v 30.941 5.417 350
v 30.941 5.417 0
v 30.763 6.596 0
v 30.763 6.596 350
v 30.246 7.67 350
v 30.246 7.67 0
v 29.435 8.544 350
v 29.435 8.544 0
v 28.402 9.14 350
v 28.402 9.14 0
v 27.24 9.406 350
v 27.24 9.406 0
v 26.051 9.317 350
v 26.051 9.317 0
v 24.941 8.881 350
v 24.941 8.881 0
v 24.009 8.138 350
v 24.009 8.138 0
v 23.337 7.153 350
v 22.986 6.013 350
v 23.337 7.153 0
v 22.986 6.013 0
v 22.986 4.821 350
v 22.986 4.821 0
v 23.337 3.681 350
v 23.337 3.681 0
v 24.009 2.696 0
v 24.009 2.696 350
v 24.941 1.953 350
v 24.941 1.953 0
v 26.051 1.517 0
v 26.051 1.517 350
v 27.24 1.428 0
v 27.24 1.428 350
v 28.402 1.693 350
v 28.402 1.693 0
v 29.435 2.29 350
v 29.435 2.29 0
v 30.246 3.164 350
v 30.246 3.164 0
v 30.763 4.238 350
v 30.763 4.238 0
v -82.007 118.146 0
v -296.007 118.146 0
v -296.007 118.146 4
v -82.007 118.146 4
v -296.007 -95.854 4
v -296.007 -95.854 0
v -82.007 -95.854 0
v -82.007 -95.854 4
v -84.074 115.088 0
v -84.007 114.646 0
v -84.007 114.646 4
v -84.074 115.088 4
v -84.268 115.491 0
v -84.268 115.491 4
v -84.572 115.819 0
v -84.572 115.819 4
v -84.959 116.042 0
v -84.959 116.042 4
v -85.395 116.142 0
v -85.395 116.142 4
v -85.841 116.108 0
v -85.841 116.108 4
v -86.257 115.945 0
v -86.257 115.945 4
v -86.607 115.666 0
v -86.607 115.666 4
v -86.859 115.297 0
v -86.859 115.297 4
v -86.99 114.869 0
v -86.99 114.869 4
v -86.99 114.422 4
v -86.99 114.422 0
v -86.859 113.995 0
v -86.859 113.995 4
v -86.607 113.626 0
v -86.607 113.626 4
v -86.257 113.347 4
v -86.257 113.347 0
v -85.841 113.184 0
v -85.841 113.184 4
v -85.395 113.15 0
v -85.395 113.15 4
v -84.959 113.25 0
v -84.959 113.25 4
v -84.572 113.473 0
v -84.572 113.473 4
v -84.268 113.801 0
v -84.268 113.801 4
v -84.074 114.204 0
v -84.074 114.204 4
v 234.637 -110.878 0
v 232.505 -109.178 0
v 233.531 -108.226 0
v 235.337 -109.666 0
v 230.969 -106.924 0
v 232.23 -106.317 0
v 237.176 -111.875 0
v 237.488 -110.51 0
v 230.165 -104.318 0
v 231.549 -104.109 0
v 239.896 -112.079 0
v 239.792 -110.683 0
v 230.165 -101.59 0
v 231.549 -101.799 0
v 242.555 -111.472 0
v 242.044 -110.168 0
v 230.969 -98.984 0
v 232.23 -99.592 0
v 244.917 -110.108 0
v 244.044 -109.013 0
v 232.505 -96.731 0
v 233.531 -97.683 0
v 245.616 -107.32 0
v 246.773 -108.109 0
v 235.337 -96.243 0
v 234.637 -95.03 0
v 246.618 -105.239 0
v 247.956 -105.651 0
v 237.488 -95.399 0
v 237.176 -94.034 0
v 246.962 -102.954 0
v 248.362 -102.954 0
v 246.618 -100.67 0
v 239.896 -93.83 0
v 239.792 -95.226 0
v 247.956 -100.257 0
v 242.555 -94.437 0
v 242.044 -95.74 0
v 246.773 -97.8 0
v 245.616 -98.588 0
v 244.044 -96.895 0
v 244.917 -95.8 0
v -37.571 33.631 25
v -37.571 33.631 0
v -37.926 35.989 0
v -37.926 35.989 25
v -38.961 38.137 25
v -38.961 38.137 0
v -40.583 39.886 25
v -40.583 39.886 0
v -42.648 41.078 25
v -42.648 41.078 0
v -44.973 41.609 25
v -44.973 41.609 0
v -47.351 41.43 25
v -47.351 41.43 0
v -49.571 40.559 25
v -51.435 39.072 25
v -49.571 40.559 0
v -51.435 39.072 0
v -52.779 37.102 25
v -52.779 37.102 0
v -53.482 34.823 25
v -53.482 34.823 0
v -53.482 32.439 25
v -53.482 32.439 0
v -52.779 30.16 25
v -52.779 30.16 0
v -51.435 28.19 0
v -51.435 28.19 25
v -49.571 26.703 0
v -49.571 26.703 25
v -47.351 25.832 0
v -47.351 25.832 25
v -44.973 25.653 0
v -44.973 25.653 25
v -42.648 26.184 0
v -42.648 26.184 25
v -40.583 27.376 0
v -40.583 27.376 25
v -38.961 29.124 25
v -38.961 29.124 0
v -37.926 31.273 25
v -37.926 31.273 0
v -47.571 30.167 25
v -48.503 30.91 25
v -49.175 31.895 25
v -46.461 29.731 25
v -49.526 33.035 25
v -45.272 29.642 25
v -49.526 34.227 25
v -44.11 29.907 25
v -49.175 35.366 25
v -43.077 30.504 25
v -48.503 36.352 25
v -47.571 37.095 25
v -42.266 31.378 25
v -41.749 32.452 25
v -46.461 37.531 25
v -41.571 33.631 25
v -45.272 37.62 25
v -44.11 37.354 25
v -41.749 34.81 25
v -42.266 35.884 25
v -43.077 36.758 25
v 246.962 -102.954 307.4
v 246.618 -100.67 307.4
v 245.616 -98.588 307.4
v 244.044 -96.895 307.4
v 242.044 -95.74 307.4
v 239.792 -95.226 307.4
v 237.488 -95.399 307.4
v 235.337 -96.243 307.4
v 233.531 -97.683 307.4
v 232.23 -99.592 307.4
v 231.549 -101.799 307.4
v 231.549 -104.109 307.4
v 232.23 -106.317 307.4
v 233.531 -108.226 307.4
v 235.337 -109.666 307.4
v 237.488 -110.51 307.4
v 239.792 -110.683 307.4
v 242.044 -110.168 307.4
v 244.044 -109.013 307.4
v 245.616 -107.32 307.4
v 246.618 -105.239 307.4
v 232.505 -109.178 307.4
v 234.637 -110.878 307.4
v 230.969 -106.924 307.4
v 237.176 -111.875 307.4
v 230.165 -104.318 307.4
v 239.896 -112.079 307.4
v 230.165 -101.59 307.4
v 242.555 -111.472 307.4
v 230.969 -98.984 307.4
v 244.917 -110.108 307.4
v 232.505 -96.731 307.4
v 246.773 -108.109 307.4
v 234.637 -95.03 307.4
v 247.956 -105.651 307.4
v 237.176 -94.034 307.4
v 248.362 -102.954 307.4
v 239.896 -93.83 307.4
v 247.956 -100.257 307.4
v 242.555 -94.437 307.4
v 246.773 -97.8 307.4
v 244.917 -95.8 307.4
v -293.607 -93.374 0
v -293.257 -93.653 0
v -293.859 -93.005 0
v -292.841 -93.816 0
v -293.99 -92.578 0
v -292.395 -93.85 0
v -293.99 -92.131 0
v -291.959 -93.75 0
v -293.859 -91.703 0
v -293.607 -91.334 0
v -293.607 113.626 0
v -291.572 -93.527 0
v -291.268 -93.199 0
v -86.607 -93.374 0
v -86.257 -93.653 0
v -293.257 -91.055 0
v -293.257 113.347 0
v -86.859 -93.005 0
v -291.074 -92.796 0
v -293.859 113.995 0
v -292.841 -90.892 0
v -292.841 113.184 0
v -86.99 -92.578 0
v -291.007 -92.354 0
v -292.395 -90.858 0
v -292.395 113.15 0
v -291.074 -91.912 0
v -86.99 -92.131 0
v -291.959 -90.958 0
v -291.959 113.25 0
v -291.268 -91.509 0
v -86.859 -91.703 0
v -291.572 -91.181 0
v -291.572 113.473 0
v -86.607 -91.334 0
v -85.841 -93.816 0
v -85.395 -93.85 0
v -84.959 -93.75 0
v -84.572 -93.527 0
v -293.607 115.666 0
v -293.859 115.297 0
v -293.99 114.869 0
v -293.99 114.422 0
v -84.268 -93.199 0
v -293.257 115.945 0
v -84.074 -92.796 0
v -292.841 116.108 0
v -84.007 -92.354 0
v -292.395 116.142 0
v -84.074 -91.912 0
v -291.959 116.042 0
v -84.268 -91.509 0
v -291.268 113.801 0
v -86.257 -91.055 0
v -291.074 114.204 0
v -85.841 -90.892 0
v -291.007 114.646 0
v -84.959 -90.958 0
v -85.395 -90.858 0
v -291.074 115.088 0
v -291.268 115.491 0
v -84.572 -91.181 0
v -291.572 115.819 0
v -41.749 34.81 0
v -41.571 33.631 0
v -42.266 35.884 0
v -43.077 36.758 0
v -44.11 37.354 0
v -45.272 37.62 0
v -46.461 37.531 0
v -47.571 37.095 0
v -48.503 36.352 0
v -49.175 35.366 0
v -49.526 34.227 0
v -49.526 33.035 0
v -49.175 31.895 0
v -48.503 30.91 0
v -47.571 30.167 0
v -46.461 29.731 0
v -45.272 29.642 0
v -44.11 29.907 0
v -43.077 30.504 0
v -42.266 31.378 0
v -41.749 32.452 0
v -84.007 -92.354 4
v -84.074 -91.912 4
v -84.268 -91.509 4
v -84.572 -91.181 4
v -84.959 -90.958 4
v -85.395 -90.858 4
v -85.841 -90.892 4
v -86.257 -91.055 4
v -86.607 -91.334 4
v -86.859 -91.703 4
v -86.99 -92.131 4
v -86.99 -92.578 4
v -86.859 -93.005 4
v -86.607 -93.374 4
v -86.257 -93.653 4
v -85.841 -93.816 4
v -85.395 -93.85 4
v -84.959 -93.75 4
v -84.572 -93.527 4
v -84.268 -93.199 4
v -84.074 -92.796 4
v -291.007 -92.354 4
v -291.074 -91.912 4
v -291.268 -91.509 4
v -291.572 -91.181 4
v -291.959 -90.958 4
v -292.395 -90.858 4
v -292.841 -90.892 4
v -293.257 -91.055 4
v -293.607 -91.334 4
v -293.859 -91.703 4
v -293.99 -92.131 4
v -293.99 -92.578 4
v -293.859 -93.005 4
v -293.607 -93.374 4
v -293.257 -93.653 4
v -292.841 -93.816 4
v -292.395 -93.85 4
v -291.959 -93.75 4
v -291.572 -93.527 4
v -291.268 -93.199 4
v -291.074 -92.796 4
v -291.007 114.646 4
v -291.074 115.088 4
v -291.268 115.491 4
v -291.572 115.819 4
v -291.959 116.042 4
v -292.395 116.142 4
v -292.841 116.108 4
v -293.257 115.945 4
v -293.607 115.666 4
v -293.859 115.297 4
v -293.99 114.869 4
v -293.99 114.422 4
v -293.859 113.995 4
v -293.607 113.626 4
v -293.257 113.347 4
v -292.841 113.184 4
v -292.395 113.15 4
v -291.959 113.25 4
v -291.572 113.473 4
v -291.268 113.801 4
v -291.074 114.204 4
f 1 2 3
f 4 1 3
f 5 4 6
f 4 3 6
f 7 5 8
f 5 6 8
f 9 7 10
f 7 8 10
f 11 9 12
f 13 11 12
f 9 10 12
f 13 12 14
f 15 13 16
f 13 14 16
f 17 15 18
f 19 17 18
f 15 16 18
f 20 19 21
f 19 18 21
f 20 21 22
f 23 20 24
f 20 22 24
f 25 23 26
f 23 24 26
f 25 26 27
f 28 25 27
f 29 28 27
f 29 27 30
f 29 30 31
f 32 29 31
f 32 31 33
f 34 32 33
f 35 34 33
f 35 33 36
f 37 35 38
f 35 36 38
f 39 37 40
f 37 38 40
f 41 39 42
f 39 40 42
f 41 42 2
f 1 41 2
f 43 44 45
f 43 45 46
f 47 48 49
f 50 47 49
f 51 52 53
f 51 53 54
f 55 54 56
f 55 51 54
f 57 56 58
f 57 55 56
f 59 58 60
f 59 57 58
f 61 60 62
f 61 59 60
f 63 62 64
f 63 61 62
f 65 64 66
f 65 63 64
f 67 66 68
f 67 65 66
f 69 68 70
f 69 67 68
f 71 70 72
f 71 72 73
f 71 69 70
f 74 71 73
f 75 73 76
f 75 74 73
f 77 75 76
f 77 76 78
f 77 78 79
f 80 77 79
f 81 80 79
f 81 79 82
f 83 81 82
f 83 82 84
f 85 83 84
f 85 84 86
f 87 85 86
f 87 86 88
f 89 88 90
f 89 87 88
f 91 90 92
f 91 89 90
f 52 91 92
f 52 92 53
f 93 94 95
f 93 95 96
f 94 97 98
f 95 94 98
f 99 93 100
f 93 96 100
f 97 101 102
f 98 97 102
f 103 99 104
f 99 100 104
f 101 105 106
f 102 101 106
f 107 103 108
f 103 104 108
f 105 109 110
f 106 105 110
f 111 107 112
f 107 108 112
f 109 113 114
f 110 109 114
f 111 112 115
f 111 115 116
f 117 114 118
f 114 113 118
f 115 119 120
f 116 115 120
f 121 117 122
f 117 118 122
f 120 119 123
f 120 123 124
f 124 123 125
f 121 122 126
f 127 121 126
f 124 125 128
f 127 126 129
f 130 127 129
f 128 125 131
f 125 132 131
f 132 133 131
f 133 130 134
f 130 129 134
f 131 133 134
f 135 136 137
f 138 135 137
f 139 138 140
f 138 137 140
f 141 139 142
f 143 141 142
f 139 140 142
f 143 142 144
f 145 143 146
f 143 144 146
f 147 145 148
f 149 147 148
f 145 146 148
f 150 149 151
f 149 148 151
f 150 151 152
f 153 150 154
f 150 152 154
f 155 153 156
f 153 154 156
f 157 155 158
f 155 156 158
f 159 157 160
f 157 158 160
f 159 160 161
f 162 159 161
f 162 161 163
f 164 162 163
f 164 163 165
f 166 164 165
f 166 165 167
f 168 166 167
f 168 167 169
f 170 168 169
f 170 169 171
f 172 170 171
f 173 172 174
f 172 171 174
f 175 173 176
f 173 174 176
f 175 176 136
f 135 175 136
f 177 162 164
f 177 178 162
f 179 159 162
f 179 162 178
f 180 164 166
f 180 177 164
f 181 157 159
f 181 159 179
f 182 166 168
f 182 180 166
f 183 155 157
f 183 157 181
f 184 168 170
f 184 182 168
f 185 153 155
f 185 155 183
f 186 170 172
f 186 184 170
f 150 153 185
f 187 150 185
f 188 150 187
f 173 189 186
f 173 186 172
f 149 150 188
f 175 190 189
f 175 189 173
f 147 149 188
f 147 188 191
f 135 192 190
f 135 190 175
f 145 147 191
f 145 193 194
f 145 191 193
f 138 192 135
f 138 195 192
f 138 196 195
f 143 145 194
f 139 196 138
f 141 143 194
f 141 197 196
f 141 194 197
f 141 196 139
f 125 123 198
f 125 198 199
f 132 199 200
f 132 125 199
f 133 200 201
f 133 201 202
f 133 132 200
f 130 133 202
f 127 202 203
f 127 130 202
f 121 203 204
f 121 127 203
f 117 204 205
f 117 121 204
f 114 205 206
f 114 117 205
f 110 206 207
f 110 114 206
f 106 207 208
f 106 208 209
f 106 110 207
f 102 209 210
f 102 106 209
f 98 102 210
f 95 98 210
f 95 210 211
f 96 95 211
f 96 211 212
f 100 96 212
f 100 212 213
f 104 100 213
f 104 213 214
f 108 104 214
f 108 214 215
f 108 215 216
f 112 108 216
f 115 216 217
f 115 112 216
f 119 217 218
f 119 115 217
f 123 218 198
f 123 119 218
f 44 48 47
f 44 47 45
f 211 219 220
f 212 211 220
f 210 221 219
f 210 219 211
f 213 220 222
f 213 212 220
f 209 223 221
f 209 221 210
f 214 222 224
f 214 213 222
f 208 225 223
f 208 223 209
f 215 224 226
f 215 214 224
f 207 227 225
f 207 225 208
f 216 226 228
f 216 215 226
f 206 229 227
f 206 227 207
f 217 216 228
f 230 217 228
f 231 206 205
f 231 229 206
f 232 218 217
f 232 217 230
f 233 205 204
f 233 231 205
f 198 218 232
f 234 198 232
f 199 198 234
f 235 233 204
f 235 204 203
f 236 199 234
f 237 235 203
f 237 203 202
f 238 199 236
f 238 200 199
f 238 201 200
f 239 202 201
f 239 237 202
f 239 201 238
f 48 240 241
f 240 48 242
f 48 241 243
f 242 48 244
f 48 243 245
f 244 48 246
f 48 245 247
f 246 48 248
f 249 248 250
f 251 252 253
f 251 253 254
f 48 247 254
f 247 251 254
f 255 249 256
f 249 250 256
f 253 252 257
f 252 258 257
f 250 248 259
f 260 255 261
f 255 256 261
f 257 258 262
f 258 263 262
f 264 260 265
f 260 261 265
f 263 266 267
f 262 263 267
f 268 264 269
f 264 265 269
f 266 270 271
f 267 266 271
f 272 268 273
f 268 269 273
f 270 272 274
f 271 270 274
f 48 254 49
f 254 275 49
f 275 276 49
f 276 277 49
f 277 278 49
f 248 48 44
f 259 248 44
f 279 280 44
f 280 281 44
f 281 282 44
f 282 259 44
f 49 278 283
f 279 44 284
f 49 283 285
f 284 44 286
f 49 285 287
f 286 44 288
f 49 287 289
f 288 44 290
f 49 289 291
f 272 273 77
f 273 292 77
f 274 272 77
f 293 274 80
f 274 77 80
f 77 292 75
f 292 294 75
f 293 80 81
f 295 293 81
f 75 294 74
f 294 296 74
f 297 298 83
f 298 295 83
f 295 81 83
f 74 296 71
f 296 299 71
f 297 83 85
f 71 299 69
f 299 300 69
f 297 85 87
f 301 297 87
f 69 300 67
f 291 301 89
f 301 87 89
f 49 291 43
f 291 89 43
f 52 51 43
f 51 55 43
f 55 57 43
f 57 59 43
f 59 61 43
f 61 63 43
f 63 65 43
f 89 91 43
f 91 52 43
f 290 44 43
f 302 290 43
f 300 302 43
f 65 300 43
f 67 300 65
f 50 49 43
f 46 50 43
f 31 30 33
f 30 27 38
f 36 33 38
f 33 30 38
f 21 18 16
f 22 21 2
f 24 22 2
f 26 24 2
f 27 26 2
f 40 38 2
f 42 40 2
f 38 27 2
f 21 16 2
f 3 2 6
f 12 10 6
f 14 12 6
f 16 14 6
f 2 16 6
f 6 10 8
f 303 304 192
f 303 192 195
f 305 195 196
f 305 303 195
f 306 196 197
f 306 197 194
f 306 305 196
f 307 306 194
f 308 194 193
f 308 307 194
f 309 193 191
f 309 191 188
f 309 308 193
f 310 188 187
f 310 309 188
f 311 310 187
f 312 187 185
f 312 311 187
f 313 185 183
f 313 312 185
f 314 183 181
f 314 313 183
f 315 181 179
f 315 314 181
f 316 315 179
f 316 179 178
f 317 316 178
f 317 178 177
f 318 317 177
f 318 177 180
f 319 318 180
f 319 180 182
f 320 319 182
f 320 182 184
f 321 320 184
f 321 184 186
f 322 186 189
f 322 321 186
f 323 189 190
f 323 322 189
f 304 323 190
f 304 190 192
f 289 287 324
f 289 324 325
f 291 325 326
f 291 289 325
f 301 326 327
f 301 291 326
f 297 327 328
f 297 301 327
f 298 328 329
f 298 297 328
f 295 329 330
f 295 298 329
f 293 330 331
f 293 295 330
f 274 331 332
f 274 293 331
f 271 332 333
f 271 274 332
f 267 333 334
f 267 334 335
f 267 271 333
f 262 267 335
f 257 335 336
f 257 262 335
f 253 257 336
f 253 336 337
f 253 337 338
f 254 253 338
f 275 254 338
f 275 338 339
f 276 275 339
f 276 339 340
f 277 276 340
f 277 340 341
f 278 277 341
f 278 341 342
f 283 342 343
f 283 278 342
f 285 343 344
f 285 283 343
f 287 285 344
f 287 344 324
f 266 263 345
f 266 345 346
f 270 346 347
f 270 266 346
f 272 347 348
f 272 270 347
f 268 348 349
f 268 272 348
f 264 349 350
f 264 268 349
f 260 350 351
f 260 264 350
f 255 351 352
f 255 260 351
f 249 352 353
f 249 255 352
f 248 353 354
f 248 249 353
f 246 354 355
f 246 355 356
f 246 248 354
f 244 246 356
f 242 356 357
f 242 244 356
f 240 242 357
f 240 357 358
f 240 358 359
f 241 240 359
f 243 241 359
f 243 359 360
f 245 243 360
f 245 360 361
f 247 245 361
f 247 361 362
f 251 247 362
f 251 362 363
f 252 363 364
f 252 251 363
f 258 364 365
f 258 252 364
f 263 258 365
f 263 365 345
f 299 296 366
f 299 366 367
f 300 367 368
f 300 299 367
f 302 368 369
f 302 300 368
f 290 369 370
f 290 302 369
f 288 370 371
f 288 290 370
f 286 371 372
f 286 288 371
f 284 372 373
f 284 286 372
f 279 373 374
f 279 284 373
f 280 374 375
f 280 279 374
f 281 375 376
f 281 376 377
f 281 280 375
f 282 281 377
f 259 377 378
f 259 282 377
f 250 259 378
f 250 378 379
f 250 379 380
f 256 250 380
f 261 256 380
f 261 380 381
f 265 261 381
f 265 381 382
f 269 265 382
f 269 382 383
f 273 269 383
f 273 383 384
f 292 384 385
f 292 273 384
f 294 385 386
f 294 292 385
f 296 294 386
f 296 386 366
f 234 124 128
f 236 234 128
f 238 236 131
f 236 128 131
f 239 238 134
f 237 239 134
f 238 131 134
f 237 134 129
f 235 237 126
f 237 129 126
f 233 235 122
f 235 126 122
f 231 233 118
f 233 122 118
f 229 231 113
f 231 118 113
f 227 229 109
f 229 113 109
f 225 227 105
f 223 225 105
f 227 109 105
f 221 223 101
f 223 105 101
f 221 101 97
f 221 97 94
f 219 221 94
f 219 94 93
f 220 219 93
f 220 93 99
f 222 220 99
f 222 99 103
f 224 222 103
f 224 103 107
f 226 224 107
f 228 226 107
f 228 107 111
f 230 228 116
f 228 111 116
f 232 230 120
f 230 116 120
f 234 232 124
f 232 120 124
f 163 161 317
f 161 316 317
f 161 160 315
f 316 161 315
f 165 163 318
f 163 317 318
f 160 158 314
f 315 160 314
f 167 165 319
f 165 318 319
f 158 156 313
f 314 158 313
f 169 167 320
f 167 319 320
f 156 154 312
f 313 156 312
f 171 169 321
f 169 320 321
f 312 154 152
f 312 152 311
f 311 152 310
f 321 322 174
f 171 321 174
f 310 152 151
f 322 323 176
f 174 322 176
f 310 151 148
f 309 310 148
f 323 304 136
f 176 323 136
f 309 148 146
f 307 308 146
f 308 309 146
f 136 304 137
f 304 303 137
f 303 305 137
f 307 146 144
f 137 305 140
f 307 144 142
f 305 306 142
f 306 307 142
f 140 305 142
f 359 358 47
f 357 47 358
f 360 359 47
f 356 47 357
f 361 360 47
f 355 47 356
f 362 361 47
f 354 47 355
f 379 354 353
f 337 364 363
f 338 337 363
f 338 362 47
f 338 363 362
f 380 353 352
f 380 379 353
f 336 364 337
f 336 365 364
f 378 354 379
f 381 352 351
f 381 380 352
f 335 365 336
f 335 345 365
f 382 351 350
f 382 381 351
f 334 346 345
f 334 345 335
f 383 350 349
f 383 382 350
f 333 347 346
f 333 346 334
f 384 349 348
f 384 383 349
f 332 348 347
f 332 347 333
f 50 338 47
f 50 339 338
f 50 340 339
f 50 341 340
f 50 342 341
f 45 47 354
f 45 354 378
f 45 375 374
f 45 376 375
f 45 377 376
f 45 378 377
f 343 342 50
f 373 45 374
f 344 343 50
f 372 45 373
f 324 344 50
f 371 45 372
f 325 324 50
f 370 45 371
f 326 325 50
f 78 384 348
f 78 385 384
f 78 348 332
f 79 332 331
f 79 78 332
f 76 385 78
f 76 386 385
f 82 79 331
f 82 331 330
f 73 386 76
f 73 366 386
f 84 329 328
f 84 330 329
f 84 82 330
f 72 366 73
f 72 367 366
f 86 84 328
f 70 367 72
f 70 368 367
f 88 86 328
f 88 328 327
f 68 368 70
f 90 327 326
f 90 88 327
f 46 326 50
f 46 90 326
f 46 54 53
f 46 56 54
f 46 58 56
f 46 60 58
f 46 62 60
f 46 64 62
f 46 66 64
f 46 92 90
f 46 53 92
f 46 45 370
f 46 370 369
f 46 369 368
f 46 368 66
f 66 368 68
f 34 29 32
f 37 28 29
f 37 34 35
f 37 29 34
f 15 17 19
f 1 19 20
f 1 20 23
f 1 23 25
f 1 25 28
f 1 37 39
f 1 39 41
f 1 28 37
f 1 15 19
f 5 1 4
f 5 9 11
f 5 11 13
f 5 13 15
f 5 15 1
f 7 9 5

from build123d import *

# Parameters (mm, degrees)
F0_R     = 8
F0_R_2   = 4
F1_DEPTH = 25
F2_DEPTH = 350
F0_W     = 214
F0_H     = 214
F0_R_3   = 1.5
F3_DEPTH = 4
F0_R_4   = 9.15
F0_R_5   = 7.75
F4_DEPTH = 307.4


with BuildPart() as f1:
    # F0 (on Top) → F1 (new body)
    with BuildSketch(Plane.XY):
        with Locations((-45.57091, 33.630934)):
            Circle(F0_R)
        with Locations((-45.57091, 33.630934)):
            Circle(F0_R_2, mode=Mode.SUBTRACT)
    extrude(amount=F1_DEPTH)


with BuildPart() as f2:
    # F0 (on Top) → F2 (new body)
    with BuildSketch(Plane.XY):
        with Locations((26.940951, 5.416973)):
            Circle(F0_R_2)
    extrude(amount=F2_DEPTH)


with BuildPart() as f3:
    # F0 (on Top) → F3 (new body)
    with BuildSketch(Plane.XY):
        with Locations((-189.007127, 11.145905)):
            Rectangle(F0_W, F0_H)
        with Locations((-292.507127, -92.354095)):
            Circle(F0_R_3, mode=Mode.SUBTRACT)
        with Locations((-85.507127, -92.354095)):
            Circle(F0_R_3, mode=Mode.SUBTRACT)
        with Locations((-292.507127, 114.645905)):
            Circle(F0_R_3, mode=Mode.SUBTRACT)
        with Locations((-85.507127, 114.645905)):
            Circle(F0_R_3, mode=Mode.SUBTRACT)
    extrude(amount=F3_DEPTH)


with BuildPart() as f4:
    # F0 (on Top) → F4 (new body)
    with BuildSketch(Plane.XY):
        with Locations((239.212424, -102.954209)):
            Circle(F0_R_4)
        with Locations((239.212424, -102.954209)):
            Circle(F0_R_5, mode=Mode.SUBTRACT)
    extrude(amount=F4_DEPTH)


solid = Compound([f1.part, f2.part, f3.part, f4.part])
